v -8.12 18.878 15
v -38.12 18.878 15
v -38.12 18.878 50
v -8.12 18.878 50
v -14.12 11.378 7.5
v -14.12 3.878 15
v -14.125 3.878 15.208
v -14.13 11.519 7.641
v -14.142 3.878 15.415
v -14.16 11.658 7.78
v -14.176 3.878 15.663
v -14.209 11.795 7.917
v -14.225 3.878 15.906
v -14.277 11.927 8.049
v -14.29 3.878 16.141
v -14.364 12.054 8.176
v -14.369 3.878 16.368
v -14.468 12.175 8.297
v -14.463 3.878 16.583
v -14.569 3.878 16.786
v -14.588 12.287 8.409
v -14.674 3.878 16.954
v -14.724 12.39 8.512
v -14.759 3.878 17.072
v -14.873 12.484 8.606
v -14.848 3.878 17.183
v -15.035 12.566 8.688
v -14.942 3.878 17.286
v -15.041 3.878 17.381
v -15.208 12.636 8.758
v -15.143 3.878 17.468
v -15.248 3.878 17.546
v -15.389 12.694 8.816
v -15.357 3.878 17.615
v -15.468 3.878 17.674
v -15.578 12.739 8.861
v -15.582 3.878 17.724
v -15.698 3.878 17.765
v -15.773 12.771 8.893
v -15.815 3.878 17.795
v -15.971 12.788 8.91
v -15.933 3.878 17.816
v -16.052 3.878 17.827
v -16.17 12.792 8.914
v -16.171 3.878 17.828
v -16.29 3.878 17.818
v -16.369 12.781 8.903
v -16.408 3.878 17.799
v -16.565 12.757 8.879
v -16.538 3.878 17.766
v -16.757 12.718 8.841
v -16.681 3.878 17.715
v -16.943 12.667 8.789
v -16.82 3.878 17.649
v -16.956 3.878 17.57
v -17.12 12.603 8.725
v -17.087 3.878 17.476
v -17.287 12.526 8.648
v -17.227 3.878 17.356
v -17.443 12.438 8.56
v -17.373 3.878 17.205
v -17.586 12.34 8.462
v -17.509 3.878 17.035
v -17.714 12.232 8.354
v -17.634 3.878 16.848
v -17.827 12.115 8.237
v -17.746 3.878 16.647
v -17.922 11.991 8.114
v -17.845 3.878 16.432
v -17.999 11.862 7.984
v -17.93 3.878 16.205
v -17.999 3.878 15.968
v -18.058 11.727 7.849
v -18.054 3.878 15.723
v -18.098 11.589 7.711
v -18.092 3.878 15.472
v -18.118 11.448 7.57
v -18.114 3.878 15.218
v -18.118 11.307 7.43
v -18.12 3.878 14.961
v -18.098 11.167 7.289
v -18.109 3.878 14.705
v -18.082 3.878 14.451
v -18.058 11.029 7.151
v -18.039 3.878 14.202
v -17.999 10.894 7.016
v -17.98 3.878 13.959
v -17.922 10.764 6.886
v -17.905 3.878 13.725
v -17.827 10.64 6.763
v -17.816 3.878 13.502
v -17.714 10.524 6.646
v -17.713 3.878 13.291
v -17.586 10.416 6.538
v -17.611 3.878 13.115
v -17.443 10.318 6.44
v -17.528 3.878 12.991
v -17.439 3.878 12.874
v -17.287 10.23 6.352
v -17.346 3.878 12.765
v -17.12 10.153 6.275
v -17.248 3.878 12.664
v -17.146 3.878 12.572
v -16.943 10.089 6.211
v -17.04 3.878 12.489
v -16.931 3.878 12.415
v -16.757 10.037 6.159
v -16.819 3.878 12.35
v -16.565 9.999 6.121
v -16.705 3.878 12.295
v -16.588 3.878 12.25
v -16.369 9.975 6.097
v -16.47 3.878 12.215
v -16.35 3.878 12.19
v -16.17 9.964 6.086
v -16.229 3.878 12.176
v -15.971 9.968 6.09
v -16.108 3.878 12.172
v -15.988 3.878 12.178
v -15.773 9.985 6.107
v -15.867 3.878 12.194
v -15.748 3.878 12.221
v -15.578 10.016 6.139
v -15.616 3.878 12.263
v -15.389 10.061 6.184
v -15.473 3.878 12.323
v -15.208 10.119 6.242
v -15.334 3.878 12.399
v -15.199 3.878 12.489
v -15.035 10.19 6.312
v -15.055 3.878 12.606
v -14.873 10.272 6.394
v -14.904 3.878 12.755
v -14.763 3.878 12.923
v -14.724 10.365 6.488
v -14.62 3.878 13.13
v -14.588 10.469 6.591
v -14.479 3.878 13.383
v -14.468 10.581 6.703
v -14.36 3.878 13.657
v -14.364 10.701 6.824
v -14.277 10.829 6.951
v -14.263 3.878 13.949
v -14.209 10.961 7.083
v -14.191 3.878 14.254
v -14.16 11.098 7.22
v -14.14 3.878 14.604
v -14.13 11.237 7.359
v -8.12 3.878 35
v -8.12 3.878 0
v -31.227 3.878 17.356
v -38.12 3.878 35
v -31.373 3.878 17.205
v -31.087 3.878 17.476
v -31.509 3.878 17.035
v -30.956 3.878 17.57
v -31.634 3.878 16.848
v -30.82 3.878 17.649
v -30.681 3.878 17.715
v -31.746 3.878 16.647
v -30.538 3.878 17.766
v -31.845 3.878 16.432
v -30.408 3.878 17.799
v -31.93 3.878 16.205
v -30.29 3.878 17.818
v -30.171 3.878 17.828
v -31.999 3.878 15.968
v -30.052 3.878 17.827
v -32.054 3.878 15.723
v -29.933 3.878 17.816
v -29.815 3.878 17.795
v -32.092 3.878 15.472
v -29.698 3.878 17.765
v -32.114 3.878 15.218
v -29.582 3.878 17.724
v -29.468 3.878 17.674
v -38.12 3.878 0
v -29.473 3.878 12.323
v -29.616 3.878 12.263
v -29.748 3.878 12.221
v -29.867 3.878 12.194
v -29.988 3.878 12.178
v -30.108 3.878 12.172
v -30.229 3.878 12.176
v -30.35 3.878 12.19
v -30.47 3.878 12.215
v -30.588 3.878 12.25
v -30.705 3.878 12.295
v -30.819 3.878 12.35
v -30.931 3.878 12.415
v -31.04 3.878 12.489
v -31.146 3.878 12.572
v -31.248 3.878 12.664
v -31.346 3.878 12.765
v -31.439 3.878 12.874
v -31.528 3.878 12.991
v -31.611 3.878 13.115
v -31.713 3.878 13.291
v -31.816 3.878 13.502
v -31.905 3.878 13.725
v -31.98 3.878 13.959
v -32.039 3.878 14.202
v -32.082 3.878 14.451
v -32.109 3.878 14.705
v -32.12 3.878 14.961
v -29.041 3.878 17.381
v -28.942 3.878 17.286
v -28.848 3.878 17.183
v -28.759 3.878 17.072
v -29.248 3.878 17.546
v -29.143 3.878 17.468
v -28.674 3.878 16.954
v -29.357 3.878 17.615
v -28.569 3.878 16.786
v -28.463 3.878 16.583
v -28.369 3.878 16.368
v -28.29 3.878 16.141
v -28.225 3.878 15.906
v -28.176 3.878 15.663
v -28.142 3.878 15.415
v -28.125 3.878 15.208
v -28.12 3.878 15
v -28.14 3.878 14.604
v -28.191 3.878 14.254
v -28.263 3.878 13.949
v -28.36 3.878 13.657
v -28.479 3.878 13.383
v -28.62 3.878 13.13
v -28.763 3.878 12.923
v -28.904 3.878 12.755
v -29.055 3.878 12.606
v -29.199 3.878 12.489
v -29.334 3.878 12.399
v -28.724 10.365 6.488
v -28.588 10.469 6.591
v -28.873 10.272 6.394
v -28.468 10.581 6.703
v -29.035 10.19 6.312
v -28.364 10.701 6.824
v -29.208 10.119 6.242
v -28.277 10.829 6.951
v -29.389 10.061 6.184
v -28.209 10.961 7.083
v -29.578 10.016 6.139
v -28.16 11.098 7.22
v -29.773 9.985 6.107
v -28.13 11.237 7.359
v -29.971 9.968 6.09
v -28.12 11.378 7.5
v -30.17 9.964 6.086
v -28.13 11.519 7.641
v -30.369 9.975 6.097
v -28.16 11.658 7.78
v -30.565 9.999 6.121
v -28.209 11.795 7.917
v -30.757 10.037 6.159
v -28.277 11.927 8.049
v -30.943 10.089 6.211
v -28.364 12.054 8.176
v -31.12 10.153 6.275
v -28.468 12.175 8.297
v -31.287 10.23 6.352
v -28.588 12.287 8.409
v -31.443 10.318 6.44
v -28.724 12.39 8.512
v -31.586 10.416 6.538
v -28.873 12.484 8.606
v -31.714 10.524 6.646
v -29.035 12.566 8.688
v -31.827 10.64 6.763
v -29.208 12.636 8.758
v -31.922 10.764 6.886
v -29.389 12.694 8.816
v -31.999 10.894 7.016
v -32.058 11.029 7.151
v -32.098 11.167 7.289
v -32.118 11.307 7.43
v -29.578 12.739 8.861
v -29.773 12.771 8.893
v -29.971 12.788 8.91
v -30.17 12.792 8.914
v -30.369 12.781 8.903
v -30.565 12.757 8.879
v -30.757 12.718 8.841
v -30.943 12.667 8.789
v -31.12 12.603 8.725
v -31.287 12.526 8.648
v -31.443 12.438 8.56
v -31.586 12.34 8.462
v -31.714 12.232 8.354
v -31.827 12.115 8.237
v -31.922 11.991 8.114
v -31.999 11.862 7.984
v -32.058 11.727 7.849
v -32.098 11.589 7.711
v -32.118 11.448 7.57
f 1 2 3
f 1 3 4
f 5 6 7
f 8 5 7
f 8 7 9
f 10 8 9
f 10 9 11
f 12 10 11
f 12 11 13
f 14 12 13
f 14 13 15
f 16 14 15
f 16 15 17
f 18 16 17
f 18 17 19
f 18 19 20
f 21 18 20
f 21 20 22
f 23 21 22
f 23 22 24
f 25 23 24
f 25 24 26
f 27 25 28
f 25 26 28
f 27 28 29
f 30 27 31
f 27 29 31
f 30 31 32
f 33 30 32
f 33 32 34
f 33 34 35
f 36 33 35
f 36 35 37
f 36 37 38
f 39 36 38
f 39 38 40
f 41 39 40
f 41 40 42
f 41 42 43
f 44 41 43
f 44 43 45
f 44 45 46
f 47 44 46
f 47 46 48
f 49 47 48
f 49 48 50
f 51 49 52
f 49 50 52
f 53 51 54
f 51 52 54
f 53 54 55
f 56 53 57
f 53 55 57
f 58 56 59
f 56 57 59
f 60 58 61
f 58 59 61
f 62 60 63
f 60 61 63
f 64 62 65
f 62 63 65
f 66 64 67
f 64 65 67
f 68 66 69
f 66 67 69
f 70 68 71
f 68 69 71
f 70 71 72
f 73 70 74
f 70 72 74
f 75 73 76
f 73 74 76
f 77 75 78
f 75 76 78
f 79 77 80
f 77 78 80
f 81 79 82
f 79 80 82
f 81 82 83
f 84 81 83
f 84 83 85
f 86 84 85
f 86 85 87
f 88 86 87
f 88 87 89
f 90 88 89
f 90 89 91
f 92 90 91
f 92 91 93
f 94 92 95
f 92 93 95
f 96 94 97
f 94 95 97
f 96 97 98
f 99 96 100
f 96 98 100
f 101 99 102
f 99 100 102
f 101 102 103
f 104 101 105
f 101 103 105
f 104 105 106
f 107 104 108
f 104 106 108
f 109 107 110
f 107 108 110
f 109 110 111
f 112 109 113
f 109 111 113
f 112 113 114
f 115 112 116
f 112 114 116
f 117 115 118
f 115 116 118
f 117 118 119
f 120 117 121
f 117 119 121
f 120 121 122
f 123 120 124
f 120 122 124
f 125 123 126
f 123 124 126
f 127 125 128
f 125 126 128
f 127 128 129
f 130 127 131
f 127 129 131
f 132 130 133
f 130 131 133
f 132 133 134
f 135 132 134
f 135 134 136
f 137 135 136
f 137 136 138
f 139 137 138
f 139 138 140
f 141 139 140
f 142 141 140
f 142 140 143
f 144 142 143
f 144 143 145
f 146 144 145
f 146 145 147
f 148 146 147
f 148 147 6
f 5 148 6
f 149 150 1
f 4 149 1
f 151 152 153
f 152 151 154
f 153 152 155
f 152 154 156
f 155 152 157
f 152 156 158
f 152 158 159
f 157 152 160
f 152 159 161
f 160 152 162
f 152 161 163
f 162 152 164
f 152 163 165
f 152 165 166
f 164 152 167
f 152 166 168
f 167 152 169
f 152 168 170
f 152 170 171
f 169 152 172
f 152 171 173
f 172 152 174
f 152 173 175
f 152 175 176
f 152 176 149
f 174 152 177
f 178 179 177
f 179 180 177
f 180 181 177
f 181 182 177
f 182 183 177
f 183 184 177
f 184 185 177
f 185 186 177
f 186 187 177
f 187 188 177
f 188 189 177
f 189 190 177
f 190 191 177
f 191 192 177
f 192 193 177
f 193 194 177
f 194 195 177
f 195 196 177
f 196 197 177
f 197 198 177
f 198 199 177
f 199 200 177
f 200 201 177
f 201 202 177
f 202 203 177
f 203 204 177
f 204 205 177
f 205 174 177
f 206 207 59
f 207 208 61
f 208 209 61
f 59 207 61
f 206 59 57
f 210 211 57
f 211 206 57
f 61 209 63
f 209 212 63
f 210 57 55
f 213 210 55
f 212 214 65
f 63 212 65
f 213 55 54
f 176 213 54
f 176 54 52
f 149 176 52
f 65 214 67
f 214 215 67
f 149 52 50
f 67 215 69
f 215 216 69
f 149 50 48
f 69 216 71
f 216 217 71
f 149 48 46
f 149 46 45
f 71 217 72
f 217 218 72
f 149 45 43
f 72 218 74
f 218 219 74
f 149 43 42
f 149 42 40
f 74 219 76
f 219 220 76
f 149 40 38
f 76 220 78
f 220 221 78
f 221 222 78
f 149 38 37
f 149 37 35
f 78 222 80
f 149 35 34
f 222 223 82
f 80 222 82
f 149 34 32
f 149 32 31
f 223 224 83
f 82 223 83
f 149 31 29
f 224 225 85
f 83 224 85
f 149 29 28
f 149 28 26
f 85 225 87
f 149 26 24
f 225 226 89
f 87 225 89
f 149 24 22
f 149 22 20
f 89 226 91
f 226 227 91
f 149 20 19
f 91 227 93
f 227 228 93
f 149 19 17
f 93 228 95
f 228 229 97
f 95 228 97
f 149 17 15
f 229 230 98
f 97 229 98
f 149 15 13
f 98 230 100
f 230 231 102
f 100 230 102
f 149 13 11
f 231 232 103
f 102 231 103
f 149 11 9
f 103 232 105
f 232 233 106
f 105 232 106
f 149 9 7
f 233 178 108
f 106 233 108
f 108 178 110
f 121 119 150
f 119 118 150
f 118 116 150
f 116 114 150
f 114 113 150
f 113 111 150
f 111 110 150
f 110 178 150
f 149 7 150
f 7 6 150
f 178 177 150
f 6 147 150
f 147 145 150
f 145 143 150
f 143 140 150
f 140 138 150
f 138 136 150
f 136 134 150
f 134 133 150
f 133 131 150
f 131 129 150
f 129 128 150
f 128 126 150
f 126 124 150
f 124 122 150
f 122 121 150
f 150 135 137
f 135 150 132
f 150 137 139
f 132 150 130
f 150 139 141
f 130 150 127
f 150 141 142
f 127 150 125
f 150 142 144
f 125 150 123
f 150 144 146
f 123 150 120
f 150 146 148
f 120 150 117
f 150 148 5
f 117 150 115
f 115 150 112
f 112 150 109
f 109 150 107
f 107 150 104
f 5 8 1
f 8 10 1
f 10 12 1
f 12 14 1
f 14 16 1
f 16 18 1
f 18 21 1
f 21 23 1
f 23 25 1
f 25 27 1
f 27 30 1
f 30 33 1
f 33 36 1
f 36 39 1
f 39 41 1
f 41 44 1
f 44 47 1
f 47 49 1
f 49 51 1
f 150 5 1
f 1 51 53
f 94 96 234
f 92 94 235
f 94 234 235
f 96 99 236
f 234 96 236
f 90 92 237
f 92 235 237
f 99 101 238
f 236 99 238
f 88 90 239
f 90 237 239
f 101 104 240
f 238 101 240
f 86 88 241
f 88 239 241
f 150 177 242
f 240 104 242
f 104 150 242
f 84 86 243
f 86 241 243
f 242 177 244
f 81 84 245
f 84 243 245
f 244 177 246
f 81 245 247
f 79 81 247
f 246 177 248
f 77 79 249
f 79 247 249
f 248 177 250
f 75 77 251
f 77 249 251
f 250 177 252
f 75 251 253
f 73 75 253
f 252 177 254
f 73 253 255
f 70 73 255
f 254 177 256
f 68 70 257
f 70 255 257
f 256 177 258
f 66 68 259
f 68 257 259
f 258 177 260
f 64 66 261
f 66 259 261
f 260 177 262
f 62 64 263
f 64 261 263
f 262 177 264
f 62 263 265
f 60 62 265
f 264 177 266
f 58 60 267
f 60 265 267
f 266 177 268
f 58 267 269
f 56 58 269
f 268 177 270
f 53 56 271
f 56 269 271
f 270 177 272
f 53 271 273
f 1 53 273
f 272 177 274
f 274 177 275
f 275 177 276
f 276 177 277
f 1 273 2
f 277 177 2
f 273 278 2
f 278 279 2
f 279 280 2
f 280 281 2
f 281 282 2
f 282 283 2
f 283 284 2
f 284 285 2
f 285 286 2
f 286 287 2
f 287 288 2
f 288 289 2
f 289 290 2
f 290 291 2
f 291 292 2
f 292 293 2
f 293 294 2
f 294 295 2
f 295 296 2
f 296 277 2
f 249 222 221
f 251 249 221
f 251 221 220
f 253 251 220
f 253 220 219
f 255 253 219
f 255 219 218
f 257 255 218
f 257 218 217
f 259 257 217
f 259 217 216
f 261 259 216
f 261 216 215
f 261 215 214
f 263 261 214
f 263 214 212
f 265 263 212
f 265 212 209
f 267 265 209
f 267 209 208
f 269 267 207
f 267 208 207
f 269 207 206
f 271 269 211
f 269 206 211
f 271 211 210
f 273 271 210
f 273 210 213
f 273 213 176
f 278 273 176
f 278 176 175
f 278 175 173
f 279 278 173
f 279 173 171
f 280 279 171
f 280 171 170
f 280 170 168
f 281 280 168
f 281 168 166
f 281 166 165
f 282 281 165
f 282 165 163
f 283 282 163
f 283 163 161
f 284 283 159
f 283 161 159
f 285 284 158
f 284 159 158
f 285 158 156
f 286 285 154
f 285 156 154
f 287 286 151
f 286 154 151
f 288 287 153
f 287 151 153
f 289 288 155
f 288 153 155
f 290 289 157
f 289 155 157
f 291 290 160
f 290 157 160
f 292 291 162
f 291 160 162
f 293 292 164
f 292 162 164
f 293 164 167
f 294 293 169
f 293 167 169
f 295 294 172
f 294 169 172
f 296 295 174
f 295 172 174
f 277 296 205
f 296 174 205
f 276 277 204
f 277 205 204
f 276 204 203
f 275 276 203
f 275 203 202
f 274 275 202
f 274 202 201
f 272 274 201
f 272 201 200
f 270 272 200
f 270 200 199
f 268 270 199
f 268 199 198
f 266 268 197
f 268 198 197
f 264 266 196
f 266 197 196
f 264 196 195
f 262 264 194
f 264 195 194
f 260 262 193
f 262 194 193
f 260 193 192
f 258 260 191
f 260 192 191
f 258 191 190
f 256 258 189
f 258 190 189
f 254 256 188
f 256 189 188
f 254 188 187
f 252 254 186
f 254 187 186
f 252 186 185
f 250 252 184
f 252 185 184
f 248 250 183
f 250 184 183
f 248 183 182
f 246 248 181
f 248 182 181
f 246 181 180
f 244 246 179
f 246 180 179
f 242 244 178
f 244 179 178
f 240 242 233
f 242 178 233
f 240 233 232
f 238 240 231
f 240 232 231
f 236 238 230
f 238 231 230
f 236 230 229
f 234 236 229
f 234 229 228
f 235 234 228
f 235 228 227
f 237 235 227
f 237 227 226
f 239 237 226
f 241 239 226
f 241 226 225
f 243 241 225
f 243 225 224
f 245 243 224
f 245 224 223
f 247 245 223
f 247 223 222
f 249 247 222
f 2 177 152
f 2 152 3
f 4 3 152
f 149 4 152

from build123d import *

# Parameters (mm, degrees)
F0_W     = 30
F0_H     = 15
F1_DEPTH = 50
F3_DEPTH = 30.001
F5_D     = 4


with BuildPart() as f1:
    # F0 (on Top) → F1 (new body)
    with BuildSketch(Plane.XY):
        with Locations((-23.119991, 11.377853)):
            Rectangle(F0_W, F0_H)
    extrude(amount=F1_DEPTH)

    # F2 (on face) → F3 (cut, through all)
    with BuildSketch(Plane(origin=(-38.119991, 0, 0), x_dir=(0, -1, 0), z_dir=(-1, 0, 0))):
        Polygon((-3.877853, 50), (-18.877853, 50), (-3.877853, 35), align=None)
        Polygon((-3.877853, 0), (-18.877853, 15), (-18.877853, 0), align=None)
    extrude(amount=-F3_DEPTH, mode=Mode.SUBTRACT)

    # F5 (through all)
    with Locations(Plane(origin=(0, 1.938926, -1.938926), x_dir=(-1, 0, 0), z_dir=(0, 0.707107, -0.707107))):
        with Locations((30.119991, 13.348658), (16.119991, 13.348658)):
            Hole(F5_D / 2)


solid = f1.part
